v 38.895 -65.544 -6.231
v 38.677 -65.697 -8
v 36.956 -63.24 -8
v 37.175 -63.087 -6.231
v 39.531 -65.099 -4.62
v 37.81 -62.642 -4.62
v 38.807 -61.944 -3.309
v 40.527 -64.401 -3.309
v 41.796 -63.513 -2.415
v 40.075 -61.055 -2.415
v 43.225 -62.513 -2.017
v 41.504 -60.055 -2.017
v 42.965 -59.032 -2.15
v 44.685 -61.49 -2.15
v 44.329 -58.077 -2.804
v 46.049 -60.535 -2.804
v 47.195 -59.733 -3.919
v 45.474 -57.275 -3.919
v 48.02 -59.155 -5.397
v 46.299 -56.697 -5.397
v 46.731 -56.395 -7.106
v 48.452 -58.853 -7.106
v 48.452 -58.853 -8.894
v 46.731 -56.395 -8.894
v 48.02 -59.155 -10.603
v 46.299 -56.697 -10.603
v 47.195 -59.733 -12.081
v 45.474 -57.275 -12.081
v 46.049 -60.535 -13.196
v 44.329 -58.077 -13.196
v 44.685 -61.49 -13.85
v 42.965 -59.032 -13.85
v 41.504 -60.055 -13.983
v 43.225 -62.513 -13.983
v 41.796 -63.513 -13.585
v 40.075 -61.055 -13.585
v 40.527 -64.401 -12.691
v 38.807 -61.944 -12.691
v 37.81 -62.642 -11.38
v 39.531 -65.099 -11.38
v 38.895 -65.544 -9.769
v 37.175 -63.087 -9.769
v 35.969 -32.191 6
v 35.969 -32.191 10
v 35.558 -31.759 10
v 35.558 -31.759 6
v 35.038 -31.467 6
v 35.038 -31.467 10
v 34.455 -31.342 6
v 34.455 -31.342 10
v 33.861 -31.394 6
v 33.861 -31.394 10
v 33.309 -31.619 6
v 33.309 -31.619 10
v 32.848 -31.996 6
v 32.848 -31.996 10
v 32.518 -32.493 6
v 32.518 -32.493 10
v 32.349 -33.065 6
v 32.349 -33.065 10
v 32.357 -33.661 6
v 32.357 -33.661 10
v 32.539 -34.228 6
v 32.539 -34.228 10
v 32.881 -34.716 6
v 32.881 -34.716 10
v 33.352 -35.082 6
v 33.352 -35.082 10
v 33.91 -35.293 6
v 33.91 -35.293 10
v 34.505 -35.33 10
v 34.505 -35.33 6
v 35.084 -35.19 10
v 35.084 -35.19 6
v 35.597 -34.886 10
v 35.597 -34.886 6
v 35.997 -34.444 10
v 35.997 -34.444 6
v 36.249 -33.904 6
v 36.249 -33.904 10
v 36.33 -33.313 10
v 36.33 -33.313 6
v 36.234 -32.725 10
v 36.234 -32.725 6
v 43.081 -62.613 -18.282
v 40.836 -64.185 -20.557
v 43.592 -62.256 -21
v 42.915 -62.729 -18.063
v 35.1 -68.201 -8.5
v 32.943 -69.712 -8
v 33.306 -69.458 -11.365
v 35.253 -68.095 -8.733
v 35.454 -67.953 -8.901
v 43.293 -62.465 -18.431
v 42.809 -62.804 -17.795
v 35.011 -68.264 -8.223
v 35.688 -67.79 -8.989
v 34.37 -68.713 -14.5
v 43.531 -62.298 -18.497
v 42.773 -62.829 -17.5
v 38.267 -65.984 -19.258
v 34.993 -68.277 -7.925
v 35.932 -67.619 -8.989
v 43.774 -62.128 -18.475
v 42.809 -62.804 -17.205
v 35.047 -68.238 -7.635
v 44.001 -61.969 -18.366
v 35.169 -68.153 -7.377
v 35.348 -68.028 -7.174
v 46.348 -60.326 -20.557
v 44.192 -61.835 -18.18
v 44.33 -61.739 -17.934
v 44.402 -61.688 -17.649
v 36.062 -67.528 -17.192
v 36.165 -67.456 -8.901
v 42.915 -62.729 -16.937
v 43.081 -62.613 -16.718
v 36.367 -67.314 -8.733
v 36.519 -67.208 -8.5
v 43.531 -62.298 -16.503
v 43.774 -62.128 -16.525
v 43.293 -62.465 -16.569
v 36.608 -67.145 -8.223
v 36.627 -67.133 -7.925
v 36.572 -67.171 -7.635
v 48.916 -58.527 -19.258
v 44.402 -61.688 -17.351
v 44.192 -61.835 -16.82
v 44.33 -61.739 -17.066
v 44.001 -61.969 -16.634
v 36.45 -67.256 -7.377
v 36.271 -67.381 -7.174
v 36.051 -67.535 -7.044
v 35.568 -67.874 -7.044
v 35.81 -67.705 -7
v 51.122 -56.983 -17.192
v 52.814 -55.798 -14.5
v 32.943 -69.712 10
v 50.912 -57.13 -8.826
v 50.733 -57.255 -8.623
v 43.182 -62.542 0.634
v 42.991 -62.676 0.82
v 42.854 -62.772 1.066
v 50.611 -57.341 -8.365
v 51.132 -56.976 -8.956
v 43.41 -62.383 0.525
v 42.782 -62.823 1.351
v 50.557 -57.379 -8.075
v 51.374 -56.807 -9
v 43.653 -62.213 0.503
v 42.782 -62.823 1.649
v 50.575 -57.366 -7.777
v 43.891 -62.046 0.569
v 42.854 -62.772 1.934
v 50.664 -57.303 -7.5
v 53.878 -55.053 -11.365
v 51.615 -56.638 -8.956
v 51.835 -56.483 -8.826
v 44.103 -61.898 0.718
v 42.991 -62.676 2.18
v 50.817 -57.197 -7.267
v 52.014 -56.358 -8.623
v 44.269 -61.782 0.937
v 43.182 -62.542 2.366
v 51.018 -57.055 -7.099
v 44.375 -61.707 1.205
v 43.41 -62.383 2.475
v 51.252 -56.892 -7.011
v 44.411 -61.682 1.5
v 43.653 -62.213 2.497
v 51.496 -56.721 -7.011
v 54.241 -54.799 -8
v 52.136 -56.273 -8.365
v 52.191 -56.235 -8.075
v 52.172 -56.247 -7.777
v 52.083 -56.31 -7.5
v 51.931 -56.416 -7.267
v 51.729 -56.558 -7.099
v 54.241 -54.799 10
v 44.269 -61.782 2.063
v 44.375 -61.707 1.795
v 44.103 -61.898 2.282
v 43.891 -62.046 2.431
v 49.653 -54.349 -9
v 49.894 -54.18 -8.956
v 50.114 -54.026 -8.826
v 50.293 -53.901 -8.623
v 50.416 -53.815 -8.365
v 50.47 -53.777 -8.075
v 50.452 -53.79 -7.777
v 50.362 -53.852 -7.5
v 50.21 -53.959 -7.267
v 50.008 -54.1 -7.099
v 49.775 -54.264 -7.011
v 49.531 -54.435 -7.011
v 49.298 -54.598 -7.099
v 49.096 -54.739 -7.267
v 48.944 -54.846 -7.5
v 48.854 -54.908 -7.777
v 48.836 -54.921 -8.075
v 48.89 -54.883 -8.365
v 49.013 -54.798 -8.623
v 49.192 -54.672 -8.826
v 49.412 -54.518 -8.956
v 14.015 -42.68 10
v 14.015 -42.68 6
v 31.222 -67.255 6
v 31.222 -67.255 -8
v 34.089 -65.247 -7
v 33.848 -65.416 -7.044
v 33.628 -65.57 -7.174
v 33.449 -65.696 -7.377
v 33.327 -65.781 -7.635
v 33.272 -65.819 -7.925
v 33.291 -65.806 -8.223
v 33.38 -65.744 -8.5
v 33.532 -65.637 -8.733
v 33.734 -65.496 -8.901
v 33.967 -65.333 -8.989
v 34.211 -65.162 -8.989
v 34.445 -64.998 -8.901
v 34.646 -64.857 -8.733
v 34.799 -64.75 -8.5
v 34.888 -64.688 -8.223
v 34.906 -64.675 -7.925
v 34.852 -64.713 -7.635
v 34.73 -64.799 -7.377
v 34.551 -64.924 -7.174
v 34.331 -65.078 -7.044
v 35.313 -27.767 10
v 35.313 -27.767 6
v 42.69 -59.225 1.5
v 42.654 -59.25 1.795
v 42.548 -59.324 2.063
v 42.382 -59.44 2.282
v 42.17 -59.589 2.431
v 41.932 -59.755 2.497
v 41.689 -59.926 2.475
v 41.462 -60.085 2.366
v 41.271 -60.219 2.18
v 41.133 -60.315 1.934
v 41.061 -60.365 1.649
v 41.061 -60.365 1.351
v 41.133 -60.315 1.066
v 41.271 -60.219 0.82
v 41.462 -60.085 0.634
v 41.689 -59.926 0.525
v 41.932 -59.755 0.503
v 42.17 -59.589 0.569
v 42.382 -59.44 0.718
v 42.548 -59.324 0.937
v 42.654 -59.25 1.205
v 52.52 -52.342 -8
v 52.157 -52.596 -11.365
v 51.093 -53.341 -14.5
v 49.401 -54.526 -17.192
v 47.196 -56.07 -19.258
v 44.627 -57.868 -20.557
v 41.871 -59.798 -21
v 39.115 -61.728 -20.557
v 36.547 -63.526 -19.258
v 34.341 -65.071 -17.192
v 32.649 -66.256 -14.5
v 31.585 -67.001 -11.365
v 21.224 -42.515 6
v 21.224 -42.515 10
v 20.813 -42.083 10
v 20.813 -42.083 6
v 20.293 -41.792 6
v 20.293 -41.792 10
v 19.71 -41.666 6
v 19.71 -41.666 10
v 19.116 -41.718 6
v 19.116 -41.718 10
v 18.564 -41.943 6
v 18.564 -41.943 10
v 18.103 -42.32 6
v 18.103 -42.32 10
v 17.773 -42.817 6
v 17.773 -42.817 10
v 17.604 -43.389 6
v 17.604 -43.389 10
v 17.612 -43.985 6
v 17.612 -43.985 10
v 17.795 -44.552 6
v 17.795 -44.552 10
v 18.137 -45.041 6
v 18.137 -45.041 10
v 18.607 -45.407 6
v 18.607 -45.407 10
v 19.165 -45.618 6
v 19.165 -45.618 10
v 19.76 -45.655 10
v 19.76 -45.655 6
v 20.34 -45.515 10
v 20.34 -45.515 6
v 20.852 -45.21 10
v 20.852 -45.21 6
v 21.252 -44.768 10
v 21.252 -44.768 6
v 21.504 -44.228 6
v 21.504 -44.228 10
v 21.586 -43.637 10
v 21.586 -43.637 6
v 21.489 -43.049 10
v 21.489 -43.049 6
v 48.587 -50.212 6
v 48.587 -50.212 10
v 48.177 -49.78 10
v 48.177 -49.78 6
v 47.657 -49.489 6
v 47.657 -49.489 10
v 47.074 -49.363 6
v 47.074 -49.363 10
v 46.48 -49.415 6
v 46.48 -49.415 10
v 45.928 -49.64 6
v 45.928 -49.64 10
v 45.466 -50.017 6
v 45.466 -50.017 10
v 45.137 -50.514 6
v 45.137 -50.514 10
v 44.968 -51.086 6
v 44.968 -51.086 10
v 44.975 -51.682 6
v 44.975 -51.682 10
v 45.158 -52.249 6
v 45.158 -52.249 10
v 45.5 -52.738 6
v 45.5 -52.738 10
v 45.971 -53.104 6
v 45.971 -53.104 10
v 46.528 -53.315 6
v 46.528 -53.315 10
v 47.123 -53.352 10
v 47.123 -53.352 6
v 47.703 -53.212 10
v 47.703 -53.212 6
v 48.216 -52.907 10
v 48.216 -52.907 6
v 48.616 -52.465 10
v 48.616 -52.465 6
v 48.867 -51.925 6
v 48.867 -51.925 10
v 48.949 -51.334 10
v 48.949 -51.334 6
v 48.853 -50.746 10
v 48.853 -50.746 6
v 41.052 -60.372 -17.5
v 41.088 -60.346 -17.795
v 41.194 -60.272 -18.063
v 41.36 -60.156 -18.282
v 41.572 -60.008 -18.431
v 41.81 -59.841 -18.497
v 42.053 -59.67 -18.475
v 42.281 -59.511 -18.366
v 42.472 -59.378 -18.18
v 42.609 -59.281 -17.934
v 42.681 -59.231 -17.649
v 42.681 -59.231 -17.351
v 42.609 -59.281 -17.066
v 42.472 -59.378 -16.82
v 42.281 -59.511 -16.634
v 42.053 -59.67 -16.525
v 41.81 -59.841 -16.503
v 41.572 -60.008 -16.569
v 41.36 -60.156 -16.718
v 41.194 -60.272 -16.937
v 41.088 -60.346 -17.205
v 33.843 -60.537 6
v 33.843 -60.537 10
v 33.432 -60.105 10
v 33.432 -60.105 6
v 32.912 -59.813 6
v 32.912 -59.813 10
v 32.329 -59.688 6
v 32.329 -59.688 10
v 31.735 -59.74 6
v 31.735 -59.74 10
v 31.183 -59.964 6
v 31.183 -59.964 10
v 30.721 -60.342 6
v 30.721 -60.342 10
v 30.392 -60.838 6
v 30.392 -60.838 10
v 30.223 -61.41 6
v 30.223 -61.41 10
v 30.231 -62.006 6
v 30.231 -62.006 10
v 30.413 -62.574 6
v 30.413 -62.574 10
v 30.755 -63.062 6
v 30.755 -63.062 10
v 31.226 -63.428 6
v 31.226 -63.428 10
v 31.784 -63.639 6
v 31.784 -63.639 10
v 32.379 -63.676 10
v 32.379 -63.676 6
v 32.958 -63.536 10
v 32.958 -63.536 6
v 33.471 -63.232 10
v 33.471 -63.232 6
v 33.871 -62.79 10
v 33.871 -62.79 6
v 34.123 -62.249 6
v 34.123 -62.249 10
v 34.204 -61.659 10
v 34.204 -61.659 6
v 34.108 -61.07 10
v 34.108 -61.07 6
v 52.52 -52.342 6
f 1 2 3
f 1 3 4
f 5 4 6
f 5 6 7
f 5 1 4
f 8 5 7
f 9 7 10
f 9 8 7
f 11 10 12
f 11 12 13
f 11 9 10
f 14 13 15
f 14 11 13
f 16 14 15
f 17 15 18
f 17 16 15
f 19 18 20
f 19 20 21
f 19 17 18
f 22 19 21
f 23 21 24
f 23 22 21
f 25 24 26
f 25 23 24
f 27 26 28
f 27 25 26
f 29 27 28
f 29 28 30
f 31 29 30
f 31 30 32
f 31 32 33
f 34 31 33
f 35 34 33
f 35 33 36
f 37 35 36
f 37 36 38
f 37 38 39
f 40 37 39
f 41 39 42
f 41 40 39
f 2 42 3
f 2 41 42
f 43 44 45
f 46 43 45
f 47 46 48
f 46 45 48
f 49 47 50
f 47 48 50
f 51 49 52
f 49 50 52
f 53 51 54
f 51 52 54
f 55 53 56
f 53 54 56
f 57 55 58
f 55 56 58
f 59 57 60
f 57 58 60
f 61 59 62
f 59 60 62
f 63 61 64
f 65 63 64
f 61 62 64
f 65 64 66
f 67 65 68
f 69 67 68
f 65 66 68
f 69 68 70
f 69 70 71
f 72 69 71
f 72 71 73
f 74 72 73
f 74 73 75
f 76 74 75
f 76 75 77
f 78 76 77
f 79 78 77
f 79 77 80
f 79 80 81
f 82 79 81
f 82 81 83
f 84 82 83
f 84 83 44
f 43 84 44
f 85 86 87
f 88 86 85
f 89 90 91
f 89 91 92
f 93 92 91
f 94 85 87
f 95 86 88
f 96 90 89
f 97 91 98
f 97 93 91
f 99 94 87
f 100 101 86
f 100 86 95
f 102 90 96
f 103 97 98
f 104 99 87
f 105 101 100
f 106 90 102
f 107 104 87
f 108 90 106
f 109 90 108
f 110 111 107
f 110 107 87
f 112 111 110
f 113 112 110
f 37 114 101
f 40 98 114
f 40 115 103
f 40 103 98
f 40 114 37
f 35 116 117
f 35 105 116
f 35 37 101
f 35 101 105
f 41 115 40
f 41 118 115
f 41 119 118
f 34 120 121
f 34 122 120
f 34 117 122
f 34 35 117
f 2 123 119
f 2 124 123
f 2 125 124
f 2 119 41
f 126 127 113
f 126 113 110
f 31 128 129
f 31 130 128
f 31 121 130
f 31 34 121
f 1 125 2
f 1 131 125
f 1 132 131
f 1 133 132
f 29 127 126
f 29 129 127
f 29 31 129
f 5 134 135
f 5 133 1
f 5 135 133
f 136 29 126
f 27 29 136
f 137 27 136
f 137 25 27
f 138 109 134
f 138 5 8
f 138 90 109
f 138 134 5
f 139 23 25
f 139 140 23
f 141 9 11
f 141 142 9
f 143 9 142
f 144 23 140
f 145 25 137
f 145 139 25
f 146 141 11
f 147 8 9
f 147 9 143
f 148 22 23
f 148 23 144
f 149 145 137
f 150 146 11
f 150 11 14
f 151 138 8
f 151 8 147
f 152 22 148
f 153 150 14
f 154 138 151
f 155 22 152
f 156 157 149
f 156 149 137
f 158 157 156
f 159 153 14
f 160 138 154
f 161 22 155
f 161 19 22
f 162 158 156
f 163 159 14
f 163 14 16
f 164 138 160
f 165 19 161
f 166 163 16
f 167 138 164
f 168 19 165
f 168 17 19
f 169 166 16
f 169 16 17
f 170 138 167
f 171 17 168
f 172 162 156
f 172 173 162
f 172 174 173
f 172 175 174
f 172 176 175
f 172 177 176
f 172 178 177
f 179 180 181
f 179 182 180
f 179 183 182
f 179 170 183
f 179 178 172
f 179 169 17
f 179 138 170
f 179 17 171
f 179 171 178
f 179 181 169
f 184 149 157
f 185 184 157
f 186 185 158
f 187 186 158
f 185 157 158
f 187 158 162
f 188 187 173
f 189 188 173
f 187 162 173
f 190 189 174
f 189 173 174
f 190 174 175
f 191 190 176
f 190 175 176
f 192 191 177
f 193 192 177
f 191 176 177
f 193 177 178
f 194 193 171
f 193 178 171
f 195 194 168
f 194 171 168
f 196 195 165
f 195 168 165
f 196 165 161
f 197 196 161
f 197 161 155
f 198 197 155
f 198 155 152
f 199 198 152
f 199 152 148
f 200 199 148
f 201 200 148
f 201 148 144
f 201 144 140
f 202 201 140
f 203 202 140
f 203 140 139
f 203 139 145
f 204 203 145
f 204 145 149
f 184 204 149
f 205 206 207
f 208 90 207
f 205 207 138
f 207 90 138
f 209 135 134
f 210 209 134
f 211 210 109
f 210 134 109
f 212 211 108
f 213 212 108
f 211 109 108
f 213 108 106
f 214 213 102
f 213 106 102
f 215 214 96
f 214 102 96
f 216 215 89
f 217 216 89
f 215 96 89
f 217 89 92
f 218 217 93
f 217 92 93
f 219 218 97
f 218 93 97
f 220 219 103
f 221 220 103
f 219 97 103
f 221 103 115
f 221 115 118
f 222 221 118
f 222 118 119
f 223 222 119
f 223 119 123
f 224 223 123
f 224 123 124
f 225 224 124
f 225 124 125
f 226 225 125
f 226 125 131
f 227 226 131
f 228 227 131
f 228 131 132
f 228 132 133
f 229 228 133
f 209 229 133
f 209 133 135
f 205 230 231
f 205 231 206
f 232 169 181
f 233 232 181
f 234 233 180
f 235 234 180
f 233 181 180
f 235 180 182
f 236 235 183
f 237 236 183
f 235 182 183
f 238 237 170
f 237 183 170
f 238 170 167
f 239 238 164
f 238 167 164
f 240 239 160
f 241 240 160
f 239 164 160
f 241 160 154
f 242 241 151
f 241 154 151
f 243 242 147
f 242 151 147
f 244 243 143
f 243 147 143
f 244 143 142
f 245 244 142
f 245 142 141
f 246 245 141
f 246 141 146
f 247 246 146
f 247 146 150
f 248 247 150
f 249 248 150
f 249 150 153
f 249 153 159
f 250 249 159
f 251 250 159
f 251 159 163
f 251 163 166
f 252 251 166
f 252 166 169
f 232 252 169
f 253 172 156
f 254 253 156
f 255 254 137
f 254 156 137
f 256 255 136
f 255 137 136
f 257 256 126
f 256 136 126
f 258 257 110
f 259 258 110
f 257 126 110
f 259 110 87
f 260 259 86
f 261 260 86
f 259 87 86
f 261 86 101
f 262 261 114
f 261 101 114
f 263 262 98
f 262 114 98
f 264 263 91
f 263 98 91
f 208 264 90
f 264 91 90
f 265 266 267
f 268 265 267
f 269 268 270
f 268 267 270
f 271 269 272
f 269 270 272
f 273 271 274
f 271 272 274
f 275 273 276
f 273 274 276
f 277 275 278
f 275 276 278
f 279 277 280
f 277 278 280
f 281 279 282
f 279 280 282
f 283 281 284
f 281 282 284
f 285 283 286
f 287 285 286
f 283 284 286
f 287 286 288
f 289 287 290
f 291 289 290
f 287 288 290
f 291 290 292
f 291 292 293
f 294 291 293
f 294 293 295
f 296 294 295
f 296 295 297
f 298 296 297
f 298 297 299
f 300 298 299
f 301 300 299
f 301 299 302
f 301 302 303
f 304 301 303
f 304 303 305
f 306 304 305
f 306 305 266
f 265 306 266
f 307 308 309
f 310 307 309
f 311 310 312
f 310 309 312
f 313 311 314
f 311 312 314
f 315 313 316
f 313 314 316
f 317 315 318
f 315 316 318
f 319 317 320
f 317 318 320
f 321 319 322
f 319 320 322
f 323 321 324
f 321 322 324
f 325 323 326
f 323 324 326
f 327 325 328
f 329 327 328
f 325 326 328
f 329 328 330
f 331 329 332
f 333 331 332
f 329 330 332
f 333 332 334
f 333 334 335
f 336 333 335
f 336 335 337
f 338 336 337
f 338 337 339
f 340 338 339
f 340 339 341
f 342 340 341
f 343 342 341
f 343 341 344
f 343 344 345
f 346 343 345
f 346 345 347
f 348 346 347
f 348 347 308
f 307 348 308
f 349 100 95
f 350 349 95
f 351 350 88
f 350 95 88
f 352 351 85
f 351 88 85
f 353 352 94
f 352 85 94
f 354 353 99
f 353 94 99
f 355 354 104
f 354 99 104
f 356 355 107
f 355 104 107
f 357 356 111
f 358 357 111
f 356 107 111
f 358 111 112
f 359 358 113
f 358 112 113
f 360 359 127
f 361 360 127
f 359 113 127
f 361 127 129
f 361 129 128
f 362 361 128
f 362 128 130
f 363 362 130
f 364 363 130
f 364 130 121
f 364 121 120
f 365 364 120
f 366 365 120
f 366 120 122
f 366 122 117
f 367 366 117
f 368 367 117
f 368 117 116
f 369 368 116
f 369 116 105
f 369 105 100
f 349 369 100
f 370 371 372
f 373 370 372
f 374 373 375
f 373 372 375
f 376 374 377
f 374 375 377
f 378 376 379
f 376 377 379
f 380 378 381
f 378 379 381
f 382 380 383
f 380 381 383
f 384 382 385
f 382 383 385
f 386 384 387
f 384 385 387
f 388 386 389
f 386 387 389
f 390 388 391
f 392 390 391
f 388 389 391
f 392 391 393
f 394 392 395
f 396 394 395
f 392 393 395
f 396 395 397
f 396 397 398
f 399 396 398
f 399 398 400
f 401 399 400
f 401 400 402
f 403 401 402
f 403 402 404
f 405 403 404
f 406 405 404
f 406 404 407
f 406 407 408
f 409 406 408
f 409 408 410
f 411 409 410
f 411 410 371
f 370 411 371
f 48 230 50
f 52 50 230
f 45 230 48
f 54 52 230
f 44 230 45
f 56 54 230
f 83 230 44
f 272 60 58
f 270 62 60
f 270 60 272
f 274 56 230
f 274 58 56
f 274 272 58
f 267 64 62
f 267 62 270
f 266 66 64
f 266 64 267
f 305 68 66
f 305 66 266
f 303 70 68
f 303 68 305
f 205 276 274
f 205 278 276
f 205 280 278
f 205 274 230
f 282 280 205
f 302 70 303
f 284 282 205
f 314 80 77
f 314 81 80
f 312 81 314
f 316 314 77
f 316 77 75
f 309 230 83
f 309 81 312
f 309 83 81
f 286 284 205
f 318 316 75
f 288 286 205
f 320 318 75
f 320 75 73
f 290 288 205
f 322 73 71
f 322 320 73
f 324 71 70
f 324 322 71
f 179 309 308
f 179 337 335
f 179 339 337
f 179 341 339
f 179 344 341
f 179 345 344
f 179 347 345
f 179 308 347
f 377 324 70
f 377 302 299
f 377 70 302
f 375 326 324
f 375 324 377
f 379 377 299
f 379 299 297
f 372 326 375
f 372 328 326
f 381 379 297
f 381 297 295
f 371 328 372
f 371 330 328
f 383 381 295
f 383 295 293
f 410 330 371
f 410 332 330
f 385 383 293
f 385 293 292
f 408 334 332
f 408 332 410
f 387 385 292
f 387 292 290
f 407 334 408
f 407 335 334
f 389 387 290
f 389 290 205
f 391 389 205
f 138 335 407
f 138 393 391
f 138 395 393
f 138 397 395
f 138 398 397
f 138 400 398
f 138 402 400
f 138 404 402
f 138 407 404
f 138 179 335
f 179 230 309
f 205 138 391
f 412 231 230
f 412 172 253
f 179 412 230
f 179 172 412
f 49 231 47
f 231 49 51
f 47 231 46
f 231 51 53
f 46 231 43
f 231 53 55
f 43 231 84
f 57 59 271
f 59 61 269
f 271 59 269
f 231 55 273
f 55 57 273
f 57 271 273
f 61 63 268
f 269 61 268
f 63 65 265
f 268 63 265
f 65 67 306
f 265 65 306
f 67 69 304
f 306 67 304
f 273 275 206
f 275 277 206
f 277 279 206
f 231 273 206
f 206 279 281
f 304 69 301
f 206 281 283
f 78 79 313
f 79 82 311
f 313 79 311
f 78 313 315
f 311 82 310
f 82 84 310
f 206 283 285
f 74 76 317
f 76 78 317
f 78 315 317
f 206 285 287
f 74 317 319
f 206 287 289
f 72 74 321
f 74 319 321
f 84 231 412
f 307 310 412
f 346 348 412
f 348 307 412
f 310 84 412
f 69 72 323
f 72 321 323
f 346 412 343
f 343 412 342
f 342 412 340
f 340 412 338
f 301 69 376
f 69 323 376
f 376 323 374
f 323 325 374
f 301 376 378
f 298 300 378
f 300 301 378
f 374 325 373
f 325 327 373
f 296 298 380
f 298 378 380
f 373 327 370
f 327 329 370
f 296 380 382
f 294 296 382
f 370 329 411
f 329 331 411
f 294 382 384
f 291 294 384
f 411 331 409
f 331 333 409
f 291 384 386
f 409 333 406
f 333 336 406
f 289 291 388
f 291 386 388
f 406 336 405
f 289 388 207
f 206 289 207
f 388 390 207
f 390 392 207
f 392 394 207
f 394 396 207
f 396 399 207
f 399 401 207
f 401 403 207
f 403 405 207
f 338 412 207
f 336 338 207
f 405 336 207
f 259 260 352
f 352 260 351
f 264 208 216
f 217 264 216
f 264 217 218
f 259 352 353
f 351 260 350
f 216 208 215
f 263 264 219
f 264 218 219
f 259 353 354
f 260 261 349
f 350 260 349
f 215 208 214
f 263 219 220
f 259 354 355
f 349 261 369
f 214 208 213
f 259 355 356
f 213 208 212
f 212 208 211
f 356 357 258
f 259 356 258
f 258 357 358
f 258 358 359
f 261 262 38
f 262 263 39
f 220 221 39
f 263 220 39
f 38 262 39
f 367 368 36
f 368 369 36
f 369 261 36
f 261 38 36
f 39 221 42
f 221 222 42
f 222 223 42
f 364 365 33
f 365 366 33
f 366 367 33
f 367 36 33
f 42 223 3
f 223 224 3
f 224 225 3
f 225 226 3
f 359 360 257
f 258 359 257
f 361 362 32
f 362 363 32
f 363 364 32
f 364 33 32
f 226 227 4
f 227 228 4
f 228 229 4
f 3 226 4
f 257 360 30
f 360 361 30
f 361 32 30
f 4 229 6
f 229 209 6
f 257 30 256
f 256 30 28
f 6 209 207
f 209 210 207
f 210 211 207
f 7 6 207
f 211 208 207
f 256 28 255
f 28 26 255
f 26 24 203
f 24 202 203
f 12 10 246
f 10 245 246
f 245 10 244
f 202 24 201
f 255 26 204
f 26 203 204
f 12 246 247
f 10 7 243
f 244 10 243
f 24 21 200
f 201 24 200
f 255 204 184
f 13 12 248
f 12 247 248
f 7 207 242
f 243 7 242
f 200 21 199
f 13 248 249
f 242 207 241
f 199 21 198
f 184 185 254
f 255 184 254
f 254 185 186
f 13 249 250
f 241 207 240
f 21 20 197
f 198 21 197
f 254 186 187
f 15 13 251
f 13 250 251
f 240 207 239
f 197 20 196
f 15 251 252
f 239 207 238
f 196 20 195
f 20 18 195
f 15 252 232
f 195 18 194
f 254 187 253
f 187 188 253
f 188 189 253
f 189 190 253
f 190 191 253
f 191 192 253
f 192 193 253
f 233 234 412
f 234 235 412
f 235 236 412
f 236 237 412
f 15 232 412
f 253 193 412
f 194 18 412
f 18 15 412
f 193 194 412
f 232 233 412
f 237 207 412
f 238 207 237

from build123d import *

# Parameters (mm, degrees)
SKETCH092_R             = 6
PAD066_DEPTH            = 3
SKETCH093_W             = 26
SKETCH093_H             = 4
PAD067_DEPTH            = 30
SKETCH094_R             = 2
POCKET034_DEPTH         = 31.001
SKETCH095_R             = 1
POCKET035_DEPTH         = 137.42322
POLARPATTERN014_COUNT   = 4
BODY040_PLACEMENT_ANGLE = 215


with BuildPart() as part:
    # Sketch092 → Pad066 (new body)
    with BuildSketch(Plane.XZ):
        with BuildLine():
            Line((-13, 18), (13, 18))
            Line((13, 18), (13, 0))
            ThreePointArc((-13, 0), (0, -13), (13, 0))
            Line((-13, 18), (-13, 0))
        make_face()
        Circle(SKETCH092_R, mode=Mode.SUBTRACT)
    extrude(amount=PAD066_DEPTH)

    # Sketch093 (on Face7 of Pad066) → Pad067 (join)
    with BuildSketch(Plane.XZ.offset(3)):
        with Locations((0, 16)):
            Rectangle(SKETCH093_W, SKETCH093_H)
    extrude(amount=PAD067_DEPTH)

    # Sketch094 (on Face5 of Pad067) → Pocket034 (cut, through all)
    with BuildSketch(Plane(origin=(0, 0, 18), x_dir=(-1, 0, 0), z_dir=(0, 0, 1))):
        with Locations((-9, 7)):
            Circle(SKETCH094_R)
        with Locations((9, 7)):
            Circle(SKETCH094_R)
        with Locations((-9, 29)):
            Circle(SKETCH094_R)
        with Locations((9, 29)):
            Circle(SKETCH094_R)
    extrude(amount=-POCKET034_DEPTH, mode=Mode.SUBTRACT)

    # Sketch095 (on Face4 of Pocket034) → Pocket035 (cut, through all)
    with BuildSketch(Plane(origin=(0, 0, 0), x_dir=(1, 0, 0), z_dir=(0, 1, 0))):
        with Locations((0, 9.5)):
            Circle(SKETCH095_R)
    pocket035 = extrude(amount=-POCKET035_DEPTH, mode=Mode.SUBTRACT)

    # PolarPattern014: Pocket035 ×4 about axis
    polarpattern014_axis = Axis((0, 0, 0), (0, 1, 0))
    for i in range(1, POLARPATTERN014_COUNT):
        add(pocket035.rotate(polarpattern014_axis, i * 360 / POLARPATTERN014_COUNT), mode=Mode.SUBTRACT)


with BuildPart() as part_1:
    # Body040 placement: moved
    add(part.part.moved(Location((43.591809, -62.255555, -8))).rotate(Axis((43.591809, -62.255555, -8), (0, 0, 1)), BODY040_PLACEMENT_ANGLE))


solid = part_1.part
